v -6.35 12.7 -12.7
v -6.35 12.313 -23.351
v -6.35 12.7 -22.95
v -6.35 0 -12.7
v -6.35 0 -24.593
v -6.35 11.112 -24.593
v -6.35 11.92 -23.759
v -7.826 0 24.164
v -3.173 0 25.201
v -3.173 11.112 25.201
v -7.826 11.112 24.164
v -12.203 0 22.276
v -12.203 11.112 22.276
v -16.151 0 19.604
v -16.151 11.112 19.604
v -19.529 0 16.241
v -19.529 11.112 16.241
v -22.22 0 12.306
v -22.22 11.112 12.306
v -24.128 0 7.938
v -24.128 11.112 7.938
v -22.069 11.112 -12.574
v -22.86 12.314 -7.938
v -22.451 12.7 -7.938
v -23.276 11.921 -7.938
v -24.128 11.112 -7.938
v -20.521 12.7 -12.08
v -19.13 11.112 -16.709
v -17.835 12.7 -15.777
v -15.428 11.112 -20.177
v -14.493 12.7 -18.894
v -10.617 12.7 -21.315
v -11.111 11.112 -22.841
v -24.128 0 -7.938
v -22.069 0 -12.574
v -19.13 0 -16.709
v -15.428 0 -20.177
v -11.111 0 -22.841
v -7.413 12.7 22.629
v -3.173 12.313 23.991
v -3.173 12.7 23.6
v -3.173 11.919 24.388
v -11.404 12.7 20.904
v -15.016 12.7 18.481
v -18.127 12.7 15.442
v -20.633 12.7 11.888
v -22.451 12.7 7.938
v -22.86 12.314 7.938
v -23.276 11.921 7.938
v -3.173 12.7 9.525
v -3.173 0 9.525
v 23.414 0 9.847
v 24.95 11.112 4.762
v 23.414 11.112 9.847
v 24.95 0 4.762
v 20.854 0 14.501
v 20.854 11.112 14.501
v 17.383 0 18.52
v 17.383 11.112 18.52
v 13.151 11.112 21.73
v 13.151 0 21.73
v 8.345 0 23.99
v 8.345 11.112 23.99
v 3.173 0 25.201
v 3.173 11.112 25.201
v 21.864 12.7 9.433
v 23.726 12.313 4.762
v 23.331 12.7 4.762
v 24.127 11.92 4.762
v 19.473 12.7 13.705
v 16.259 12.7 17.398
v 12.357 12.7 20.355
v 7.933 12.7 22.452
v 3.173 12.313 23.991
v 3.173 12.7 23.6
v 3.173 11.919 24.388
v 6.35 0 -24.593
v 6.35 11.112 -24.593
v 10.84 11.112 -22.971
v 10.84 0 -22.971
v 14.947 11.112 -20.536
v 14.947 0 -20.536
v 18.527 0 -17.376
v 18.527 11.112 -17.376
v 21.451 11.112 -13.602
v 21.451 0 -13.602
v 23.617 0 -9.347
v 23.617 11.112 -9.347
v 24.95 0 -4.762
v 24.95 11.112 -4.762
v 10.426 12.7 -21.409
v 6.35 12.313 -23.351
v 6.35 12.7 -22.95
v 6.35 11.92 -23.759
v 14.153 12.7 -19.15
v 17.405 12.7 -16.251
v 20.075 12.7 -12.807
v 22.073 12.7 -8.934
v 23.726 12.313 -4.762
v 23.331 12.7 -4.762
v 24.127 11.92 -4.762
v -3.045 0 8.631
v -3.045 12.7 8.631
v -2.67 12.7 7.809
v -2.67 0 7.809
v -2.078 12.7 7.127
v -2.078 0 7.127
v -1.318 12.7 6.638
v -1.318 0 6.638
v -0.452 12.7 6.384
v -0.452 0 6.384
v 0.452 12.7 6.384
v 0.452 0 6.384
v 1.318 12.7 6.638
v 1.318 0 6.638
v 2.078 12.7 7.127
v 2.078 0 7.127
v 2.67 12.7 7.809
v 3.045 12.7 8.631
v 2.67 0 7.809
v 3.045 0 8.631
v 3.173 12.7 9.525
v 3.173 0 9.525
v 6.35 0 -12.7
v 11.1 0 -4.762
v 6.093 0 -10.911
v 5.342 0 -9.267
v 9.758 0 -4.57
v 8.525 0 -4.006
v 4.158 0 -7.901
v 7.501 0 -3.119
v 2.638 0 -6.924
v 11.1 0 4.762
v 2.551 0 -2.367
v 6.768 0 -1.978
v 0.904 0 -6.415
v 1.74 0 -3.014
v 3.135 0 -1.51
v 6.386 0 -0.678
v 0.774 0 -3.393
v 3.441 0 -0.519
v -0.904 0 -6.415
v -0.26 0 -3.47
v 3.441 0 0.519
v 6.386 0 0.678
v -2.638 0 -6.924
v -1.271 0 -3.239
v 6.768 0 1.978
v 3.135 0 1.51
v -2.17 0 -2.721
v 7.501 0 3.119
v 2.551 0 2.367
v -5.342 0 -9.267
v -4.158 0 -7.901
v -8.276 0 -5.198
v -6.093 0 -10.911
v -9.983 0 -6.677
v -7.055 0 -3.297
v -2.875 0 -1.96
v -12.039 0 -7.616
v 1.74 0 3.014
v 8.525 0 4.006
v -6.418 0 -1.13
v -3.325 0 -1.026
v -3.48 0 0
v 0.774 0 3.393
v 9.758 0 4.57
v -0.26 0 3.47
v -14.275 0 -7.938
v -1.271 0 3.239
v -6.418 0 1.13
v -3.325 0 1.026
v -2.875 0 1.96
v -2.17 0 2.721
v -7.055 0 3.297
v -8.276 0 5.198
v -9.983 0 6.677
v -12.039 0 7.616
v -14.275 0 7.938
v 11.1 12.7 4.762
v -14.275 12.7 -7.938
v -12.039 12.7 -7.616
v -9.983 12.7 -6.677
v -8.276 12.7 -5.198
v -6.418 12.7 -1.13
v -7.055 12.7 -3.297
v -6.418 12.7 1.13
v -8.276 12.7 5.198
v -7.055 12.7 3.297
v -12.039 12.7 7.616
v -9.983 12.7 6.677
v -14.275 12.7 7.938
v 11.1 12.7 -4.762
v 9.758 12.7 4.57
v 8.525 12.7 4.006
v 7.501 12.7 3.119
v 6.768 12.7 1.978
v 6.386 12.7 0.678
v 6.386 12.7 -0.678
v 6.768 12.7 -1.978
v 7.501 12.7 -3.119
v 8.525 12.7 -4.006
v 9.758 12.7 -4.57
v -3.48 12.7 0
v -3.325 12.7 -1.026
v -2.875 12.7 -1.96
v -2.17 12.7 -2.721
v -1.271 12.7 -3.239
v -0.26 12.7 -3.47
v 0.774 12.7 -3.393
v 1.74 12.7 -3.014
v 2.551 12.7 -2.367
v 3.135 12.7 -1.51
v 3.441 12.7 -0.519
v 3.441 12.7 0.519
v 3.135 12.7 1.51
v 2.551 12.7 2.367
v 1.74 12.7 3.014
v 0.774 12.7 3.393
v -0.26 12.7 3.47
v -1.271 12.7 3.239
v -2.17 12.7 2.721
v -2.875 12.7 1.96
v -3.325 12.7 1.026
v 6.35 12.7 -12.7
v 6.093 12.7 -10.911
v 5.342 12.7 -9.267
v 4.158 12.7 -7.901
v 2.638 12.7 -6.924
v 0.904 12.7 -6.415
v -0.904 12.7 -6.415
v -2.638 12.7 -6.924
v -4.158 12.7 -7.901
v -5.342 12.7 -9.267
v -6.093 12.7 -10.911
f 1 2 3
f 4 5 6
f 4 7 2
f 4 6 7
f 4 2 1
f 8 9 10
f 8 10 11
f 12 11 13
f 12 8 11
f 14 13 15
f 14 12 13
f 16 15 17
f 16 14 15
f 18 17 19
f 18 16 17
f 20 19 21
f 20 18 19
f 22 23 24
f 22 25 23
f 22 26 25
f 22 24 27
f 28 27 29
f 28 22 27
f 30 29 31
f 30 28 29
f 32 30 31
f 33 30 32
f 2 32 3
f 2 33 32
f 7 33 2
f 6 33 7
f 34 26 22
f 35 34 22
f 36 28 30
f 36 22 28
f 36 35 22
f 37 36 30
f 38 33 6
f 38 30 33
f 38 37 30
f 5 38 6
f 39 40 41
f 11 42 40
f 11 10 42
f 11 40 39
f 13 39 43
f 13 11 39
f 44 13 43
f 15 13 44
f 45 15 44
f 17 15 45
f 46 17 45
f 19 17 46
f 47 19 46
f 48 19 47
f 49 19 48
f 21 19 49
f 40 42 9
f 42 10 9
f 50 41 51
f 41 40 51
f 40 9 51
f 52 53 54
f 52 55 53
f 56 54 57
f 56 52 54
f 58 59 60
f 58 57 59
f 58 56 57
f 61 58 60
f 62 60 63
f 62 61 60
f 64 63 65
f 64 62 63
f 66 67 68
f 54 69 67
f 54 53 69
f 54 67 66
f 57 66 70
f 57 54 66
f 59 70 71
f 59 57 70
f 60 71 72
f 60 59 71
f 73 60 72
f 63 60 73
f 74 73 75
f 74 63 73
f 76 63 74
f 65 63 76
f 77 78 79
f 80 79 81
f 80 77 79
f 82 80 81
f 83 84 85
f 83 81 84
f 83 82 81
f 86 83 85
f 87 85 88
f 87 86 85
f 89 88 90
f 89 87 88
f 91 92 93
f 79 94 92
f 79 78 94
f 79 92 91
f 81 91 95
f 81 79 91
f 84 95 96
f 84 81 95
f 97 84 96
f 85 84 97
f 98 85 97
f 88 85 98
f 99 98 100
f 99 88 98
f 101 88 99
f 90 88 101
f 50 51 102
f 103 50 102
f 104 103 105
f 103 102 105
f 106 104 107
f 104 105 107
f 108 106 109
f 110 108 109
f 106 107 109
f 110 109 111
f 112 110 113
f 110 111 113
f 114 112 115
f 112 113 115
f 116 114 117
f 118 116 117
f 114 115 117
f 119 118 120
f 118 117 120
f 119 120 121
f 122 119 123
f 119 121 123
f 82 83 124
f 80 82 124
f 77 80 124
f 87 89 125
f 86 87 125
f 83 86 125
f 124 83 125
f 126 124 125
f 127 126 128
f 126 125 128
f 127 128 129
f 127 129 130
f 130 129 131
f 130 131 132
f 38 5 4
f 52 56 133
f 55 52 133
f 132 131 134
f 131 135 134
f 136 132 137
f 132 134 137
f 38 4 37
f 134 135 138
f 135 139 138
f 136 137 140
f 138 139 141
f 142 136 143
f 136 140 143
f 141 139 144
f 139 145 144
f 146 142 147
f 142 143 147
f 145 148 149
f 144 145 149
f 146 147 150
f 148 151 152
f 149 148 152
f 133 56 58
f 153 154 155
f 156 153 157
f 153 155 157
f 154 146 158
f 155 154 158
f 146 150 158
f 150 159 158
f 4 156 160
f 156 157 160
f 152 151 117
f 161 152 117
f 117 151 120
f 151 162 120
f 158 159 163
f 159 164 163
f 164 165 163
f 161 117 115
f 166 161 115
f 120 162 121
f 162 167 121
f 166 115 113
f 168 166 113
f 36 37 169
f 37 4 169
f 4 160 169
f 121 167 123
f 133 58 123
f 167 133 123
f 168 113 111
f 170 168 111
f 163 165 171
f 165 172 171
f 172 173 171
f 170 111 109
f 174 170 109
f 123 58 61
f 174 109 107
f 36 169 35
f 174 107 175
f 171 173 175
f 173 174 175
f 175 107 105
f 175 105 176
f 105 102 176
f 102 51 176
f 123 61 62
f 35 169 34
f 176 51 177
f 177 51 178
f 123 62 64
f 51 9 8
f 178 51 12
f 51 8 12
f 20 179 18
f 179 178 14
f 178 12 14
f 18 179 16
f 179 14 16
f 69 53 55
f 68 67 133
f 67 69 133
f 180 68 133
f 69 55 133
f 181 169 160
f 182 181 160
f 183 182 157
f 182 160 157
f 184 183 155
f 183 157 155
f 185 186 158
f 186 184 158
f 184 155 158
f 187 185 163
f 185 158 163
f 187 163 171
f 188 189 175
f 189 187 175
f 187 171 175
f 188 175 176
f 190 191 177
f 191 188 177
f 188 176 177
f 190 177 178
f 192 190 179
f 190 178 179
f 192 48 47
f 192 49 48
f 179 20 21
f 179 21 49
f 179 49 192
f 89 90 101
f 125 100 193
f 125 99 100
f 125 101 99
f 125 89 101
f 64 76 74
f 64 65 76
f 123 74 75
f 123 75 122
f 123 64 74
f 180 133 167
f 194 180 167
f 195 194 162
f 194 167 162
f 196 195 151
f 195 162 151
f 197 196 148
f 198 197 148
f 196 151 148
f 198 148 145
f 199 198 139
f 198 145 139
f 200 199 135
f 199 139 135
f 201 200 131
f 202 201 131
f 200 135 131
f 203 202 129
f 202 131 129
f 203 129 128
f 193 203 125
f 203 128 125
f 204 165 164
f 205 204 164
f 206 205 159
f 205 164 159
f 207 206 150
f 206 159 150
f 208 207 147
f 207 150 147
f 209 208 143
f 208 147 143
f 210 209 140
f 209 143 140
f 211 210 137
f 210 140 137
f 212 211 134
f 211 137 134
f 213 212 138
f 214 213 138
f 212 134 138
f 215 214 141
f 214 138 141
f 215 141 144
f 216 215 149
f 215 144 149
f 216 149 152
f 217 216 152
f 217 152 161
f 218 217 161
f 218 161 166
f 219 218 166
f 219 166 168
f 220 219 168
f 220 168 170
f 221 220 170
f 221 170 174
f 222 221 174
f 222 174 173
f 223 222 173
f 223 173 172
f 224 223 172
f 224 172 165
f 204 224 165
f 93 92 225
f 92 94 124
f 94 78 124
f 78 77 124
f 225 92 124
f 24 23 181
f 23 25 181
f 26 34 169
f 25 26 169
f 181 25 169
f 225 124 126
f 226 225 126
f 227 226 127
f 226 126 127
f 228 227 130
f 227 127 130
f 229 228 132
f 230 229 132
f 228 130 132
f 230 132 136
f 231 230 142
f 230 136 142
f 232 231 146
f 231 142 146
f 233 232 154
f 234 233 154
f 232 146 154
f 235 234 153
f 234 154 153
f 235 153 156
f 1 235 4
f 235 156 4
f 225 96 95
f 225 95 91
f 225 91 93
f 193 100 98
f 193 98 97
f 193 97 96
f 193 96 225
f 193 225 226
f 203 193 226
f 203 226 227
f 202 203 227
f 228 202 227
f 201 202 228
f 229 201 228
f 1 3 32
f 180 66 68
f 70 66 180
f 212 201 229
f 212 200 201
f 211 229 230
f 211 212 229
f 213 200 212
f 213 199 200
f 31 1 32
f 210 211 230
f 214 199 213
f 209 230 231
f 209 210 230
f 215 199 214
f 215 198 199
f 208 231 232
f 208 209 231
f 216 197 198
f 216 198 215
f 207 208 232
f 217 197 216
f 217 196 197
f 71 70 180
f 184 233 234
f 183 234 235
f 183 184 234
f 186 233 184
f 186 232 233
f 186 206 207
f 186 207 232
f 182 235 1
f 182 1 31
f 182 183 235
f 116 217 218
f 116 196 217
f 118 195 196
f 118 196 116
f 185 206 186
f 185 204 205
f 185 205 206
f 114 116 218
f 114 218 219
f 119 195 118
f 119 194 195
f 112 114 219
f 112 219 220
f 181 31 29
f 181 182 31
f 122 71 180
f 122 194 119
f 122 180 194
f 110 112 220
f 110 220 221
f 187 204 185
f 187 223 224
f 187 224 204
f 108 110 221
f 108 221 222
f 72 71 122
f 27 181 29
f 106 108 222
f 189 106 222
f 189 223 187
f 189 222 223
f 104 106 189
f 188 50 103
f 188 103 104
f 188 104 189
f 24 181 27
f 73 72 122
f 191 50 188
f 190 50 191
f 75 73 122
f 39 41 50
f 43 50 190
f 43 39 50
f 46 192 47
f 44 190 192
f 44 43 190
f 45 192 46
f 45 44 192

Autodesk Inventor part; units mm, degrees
ref_plane "YZ Plane" through (0, 0, 0) normal (1, 0, 0) x (0, 1, 0)
ref_plane "XZ Plane" through (0, 0, 0) normal (0, 1, 0) x (-1, 0, 0)
ref_plane "XY Plane" through (0, 0, 0) normal (0, 0, 1) x (1, 0, 0)
sketch "Sketch1" plane through (0, 0, 0) normal (0, 1, 0) x (-1, 0, 0)
  line L0 (37.6078, 0) -> (-39.2505, 0) projected
  line L1 (0, -38.4978) -> (0, 39.9458) projected
  circle A0 centre (0, 0) radius 3.4798
  line L2 (3.1734, 25.201) -> (3.1734, 9.525)
  line L3 (-3.1734, 25.201) -> (-3.1734, 9.525)
  arc A1 (-3.1734, 9.525) -> (3.1734, 9.525) centre (0, 9.525) ccw
  line L4 (-6.35, -24.5934) -> (-6.35, -12.7)
  line L5 (6.35, -24.5934) -> (6.35, -12.7)
  arc A2 (6.35, -12.7) -> (-6.35, -12.7) centre (0, -12.7) ccw
  line L6 (-24.9495, 4.7625) -> (-11.0998, 4.7625)
  line L7 (-24.9495, -4.7625) -> (-11.0998, -4.7625)
  arc A3 (-11.0998, -4.7625) -> (-11.0998, 4.7625) centre (-11.0998, 0) ccw
  line L8 (24.1279, 7.9375) -> (14.2748, 7.9375)
  line L9 (24.1279, -7.9375) -> (14.2748, -7.9375)
  arc A4 (14.2748, 7.9375) -> (14.2748, -7.9375) centre (14.2748, 0) ccw
  arc A5 (-24.9495, -4.7625) -> (-6.35, -24.5934) centre (0, 0) ccw
  arc A6 (6.35, -24.5934) -> (24.1279, -7.9375) centre (0, 0) ccw
  arc A7 (24.1279, 7.9375) -> (3.1734, 25.201) centre (0, 0) ccw
  arc A8 (-3.1734, 25.201) -> (-24.9495, 4.7625) centre (0, 0) ccw
  dimension "d1" = 6.9596
  dimension "d5" = 9.525
  dimension "d6" = 12.7
  dimension "d7" = 9.525
  dimension "d8" = 6.3469
  dimension "d9" = 12.7
  dimension "d11" = 15.875
  dimension "d12" = 11.0998
  dimension "d13" = 14.2748
  dimension "d14" = 25.4
extrude "Extrusion1" add sketch "Sketch1" along normal blind 12.7 contours A4 L9 A6 L5 A2 L1 A0 L0 | L0 A0 L1 A1 L2 A7 L8 A4 | A0 L0 A3 L6 A8 L3 A1 L1 | L1 A2 L4 A5 L7 A3 L0 A0
chamfer "Chamfer1" distance 1.5875 angle 45 4 edges at (-16.1508, 12.7, 19.6039) (-17.3661, 12.7, -18.5359) (18.5265, 12.7, -17.3761) (17.3827, 12.7, 18.5203)
properties part number "Ch7(5) Part 3 Table"
